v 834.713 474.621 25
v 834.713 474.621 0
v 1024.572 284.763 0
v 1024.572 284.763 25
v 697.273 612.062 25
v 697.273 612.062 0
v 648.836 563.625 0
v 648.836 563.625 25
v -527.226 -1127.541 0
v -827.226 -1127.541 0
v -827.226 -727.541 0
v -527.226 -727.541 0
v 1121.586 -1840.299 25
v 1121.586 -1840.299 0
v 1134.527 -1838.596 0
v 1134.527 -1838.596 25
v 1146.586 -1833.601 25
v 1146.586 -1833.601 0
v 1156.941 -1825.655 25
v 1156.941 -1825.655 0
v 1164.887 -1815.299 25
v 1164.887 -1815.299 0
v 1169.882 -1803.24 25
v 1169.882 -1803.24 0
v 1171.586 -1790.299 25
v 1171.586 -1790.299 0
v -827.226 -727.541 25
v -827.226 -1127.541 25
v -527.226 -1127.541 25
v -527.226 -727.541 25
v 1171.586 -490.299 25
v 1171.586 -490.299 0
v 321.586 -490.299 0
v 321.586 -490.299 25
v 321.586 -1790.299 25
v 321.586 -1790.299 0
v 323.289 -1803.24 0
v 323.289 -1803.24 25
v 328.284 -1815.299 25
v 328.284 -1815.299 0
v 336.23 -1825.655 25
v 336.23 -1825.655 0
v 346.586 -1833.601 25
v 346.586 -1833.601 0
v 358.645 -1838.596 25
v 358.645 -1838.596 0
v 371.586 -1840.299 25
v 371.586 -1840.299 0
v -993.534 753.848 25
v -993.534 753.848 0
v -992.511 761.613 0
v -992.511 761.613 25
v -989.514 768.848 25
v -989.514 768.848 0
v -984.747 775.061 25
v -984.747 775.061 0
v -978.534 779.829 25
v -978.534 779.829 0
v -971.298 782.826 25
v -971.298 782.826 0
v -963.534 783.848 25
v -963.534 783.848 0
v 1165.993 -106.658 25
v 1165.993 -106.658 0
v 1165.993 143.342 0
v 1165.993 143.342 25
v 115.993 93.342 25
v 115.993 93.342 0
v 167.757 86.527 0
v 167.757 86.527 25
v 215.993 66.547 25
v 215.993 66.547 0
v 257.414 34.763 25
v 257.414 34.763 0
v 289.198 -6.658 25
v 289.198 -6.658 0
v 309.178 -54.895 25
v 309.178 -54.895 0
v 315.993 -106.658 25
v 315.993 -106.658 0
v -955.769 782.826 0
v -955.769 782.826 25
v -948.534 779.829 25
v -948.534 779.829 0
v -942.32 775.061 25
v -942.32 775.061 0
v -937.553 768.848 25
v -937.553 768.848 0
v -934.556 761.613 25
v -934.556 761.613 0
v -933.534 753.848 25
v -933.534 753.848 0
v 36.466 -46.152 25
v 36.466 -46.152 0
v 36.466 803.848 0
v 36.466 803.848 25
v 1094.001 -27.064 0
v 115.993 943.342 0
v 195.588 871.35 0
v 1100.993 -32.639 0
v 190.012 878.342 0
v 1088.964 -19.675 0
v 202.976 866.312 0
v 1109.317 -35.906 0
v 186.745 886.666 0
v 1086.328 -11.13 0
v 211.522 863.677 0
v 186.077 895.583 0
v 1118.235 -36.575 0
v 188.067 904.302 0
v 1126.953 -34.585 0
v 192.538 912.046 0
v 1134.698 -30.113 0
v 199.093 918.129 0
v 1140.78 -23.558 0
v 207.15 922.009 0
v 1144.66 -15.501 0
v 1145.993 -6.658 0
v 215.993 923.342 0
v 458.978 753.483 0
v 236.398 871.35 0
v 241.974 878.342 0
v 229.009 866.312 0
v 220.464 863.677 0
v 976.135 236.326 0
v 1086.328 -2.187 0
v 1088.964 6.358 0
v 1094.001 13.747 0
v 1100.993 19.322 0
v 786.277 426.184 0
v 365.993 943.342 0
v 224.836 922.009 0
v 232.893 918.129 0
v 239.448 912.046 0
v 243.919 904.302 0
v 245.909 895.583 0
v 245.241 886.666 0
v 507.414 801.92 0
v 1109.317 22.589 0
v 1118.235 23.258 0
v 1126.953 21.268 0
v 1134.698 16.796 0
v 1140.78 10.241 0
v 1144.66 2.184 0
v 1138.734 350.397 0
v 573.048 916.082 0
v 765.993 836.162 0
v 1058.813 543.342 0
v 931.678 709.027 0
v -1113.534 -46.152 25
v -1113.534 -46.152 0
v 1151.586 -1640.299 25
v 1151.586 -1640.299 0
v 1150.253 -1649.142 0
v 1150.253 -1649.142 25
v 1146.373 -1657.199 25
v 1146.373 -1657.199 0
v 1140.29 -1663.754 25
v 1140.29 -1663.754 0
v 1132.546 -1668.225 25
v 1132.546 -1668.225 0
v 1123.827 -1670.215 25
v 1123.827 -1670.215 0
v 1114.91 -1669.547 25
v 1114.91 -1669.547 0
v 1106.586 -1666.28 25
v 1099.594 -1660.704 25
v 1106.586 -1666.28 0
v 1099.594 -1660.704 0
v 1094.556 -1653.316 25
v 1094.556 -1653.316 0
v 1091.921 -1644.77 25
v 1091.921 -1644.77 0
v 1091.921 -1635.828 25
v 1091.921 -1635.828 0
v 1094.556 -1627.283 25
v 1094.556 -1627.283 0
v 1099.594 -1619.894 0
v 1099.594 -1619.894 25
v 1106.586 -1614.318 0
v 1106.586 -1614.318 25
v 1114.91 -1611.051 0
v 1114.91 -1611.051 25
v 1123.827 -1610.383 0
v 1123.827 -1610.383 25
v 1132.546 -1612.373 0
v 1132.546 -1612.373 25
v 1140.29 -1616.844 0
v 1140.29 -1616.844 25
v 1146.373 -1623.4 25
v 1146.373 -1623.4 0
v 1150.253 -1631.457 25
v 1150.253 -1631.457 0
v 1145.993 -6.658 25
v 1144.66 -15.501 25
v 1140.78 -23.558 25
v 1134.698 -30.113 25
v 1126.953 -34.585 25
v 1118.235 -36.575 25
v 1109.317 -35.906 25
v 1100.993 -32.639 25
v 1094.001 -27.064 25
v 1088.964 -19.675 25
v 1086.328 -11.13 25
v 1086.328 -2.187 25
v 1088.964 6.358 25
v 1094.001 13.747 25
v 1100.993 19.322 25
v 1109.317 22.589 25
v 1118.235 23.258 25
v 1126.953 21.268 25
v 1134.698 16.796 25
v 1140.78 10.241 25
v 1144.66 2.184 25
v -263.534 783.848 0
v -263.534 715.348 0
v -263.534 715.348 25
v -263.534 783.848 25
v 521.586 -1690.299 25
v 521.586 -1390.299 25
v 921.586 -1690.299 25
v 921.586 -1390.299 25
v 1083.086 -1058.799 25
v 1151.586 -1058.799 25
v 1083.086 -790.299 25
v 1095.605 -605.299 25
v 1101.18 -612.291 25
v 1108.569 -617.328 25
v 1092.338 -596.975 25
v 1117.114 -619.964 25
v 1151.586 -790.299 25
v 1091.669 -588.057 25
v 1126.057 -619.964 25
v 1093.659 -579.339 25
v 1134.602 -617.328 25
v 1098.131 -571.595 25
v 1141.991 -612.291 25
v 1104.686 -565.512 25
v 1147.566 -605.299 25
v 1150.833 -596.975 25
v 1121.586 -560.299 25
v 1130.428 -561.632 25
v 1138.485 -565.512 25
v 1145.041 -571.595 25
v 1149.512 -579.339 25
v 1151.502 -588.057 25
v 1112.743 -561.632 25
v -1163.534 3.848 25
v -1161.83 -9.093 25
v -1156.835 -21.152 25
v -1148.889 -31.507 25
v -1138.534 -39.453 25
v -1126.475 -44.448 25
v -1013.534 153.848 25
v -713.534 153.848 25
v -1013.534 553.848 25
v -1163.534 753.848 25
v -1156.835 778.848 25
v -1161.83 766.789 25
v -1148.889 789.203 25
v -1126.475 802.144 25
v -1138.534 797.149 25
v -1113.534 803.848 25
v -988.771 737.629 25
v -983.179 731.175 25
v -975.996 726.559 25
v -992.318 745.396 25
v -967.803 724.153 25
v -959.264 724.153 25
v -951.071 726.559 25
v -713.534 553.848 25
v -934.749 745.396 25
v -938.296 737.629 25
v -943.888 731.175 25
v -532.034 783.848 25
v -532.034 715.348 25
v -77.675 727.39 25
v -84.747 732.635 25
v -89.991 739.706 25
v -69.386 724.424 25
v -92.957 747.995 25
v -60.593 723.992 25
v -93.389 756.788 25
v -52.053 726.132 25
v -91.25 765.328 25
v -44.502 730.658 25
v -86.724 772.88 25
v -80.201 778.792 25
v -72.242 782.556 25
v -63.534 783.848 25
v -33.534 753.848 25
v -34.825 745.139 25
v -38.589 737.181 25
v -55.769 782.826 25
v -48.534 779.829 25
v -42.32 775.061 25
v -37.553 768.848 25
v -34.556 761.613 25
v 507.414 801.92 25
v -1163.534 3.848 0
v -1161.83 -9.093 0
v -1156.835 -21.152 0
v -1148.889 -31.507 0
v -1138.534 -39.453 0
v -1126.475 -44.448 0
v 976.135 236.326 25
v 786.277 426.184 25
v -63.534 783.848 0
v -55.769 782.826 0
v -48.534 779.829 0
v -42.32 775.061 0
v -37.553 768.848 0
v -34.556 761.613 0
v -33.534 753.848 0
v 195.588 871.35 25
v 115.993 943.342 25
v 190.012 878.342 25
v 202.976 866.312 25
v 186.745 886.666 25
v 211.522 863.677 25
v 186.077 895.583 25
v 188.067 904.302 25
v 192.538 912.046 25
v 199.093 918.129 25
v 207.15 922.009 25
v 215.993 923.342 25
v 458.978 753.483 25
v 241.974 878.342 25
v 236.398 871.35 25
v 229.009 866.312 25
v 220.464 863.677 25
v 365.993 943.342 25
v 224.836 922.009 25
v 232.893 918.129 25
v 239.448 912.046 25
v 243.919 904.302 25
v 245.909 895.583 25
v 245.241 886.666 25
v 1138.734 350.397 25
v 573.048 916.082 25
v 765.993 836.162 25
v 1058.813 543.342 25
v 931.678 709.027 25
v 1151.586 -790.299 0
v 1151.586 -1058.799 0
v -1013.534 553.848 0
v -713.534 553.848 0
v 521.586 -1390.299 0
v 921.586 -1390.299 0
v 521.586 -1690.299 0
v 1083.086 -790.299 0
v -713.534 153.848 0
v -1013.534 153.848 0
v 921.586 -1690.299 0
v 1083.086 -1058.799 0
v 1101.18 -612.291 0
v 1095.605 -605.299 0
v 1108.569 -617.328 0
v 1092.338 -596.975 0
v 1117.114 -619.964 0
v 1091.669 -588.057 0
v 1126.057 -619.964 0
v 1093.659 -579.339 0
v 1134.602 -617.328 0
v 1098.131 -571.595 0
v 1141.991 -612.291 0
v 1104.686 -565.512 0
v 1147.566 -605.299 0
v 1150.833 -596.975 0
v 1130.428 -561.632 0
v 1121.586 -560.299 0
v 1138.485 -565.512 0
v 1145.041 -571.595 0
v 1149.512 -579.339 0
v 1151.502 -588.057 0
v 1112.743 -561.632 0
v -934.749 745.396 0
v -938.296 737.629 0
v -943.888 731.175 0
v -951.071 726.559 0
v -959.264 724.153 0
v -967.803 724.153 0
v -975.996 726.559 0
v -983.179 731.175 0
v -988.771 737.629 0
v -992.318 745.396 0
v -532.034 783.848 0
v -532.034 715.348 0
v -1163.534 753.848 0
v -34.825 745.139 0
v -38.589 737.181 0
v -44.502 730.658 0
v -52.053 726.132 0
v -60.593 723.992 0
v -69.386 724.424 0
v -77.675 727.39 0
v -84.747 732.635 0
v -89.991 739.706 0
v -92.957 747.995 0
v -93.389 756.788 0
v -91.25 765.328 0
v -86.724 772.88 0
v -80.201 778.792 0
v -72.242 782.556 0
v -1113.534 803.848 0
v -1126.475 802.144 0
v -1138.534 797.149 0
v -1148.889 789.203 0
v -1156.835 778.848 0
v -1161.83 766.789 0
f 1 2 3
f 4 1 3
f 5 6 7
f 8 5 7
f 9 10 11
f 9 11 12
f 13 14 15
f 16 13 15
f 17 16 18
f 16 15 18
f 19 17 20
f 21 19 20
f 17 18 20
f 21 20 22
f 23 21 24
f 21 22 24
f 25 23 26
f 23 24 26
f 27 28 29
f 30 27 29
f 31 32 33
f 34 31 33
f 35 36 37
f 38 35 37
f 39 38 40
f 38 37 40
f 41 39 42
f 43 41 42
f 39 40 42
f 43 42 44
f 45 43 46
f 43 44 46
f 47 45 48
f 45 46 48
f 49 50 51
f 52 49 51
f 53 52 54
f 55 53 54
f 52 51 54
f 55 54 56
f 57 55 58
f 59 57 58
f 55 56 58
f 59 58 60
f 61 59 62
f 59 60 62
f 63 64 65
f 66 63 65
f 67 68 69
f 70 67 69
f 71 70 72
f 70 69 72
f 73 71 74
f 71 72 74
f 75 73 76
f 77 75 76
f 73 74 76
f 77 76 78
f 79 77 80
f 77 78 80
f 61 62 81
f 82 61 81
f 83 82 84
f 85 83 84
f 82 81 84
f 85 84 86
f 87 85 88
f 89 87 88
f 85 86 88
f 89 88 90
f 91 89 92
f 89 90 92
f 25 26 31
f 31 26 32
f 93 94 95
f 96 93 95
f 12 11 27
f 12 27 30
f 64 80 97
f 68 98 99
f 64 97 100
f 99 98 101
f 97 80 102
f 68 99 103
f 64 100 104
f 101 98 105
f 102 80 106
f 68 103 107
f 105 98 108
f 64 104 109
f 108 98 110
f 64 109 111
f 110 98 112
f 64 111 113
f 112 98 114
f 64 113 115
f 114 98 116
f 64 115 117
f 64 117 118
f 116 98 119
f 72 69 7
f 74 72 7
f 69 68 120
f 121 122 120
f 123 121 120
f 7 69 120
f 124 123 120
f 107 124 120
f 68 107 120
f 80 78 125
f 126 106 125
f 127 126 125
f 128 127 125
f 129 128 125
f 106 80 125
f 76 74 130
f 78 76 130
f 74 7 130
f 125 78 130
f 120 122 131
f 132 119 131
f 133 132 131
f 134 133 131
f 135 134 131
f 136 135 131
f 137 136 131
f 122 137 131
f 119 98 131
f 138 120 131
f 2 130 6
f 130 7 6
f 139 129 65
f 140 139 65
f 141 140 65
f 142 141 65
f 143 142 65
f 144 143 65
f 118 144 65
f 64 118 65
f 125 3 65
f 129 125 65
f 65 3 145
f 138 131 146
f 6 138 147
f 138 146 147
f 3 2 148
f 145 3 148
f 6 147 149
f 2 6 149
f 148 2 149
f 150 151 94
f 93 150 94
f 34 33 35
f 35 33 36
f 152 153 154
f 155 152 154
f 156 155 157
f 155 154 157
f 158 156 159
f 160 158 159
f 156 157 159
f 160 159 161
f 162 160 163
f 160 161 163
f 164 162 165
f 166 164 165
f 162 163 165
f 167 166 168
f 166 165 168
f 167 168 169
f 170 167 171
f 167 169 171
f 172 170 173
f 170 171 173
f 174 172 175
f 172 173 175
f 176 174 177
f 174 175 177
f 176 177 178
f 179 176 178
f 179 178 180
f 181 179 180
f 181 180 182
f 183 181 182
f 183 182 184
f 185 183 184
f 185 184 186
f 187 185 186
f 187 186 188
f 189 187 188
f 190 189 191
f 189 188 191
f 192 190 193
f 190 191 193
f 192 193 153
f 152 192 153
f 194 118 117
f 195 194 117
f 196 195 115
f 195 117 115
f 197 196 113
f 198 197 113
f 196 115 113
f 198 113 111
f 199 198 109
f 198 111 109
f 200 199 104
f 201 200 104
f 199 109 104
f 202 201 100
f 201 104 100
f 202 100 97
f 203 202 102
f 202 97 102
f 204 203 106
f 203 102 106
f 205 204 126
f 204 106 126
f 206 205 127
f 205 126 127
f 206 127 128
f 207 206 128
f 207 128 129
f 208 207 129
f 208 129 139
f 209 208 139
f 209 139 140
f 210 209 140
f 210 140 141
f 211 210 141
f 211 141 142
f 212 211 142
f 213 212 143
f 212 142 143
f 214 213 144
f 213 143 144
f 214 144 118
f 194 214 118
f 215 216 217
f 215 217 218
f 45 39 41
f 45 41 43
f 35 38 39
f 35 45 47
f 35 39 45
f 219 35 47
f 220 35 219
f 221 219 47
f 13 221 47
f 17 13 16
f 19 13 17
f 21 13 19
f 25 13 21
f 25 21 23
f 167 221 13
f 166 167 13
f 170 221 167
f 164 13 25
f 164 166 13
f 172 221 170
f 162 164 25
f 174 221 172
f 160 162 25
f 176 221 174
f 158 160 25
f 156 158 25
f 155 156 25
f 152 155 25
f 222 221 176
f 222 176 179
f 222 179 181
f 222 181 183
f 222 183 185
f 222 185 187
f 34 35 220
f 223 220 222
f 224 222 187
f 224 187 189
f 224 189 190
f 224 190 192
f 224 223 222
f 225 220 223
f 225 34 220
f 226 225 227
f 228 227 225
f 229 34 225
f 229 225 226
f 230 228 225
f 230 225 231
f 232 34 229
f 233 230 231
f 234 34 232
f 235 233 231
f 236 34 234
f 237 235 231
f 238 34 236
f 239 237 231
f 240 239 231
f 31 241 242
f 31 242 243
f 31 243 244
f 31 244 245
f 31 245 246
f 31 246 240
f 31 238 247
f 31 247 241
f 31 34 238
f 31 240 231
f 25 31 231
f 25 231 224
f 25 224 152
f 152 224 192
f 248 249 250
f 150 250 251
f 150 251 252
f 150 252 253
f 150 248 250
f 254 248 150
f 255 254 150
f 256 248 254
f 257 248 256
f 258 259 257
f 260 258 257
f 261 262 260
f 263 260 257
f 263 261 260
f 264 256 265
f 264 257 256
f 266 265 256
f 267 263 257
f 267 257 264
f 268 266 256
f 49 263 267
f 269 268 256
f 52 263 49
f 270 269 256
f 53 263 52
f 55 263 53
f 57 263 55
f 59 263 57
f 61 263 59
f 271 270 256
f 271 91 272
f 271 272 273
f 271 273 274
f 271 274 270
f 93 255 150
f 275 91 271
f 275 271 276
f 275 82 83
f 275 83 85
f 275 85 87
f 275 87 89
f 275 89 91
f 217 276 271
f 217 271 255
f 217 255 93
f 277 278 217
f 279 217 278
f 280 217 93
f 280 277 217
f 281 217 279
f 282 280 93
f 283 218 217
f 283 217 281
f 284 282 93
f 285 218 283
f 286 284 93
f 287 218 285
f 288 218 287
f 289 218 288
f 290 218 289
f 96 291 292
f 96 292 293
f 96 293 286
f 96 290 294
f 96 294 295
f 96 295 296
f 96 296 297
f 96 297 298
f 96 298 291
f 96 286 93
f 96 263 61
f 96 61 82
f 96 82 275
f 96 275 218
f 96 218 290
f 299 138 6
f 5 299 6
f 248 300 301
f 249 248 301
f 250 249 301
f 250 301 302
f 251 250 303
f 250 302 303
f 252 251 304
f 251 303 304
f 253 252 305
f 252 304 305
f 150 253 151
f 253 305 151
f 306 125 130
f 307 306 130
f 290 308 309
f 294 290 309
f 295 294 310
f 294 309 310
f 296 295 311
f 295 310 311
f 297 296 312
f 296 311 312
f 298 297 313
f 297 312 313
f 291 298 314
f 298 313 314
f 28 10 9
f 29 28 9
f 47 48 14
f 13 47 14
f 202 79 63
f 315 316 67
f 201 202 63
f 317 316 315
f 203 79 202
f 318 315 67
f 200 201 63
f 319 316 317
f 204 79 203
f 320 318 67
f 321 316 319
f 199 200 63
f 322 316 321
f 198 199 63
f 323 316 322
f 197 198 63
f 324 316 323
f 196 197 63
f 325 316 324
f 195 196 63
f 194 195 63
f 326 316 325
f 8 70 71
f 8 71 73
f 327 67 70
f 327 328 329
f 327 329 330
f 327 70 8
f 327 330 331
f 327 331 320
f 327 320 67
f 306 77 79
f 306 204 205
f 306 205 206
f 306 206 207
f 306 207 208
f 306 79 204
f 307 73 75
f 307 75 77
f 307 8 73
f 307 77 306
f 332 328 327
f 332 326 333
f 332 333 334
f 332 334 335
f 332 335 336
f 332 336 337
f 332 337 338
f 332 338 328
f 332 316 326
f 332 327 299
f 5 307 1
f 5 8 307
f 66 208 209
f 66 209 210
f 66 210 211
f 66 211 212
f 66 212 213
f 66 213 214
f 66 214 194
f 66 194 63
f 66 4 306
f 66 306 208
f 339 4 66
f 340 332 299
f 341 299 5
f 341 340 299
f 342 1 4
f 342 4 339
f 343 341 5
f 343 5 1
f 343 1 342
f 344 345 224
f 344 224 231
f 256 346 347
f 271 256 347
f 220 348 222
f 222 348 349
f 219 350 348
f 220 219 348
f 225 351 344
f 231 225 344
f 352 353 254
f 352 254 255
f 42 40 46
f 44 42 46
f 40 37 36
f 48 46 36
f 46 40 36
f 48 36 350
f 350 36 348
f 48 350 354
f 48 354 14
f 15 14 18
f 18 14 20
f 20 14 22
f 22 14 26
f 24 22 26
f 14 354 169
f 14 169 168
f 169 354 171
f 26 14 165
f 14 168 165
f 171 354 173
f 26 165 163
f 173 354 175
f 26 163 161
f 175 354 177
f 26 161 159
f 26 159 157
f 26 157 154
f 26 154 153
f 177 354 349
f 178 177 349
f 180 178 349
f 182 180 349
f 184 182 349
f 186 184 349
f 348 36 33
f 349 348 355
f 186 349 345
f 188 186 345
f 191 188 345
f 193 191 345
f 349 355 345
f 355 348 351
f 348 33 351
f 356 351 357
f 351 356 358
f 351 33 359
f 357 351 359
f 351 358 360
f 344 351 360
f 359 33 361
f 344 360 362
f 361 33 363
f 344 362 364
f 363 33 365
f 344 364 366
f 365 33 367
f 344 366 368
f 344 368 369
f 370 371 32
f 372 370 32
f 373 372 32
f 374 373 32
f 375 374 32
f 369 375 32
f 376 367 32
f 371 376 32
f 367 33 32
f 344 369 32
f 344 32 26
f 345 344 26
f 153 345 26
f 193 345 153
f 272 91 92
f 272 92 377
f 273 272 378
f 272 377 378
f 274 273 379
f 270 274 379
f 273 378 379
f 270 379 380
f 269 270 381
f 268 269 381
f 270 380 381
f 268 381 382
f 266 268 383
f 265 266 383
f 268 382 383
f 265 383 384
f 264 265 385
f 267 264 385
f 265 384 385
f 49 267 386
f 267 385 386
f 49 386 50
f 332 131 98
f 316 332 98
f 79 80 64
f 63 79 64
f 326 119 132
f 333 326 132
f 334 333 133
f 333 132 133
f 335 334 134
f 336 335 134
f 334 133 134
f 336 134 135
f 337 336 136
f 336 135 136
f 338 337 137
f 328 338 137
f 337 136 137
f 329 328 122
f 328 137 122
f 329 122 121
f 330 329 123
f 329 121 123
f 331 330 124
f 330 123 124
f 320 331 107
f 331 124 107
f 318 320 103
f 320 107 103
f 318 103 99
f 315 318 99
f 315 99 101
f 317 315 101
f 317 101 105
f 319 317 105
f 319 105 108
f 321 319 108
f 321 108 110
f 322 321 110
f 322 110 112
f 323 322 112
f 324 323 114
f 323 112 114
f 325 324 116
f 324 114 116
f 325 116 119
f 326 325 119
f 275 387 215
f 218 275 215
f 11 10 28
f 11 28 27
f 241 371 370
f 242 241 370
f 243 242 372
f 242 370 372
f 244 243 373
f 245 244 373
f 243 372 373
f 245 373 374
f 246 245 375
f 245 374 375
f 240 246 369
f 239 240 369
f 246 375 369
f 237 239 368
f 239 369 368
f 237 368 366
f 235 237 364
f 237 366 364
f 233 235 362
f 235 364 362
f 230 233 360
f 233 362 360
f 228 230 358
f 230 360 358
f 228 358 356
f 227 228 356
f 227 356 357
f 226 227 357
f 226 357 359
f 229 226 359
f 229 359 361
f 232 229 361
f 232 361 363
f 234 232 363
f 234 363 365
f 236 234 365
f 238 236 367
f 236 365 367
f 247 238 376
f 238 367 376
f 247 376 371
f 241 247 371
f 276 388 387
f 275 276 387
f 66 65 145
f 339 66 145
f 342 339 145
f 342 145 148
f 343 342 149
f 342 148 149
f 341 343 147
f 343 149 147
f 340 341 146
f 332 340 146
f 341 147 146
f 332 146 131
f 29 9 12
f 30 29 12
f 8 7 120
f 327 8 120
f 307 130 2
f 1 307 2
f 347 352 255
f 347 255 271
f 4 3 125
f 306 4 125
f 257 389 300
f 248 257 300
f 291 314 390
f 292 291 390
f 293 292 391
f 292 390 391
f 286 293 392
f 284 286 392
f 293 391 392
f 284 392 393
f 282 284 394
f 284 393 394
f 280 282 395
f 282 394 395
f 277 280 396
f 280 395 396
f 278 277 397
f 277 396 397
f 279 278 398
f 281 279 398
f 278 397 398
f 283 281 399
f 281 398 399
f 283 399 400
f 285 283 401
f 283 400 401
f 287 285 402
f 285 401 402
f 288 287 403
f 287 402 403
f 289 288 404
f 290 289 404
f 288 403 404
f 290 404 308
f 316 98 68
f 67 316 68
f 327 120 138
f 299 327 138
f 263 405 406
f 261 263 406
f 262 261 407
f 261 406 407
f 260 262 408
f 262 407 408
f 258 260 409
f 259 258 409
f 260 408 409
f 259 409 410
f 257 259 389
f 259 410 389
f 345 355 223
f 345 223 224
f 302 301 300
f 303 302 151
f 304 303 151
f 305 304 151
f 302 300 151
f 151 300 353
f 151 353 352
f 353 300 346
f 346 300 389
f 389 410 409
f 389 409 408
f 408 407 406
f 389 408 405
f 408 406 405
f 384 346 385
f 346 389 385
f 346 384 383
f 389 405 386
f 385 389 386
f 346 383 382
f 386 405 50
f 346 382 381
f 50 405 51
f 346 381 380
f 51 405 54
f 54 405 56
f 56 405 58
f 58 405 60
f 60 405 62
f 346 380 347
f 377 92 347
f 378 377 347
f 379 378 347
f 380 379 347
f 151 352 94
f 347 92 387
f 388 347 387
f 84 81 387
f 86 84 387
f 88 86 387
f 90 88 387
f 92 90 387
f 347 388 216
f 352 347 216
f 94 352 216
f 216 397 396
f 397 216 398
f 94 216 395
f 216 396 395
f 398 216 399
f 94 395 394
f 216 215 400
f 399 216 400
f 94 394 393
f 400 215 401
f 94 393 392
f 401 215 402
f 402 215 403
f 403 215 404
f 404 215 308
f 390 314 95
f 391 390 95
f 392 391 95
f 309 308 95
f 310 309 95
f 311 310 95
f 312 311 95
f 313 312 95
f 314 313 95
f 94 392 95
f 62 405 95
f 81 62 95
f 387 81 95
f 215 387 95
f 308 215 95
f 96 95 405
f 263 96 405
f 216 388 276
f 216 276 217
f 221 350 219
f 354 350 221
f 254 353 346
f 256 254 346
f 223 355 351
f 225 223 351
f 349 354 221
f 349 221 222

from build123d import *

# Parameters (mm, degrees)
F0_W     = 268.5
F0_H     = 68.5
F0_W_2   = 300
F0_H_2   = 400
F1_DEPTH = 25
F0_W_3   = 400
F0_H_3   = 300
F0_W_4   = 68.5
F0_H_4   = 268.5


with BuildPart() as f1:
    # F0 (on Top) → F1 (new body)
    with BuildSketch(Plane.XY):
        with BuildLine():
            Line((-1063.5335713625, 803.8479559124), (-1113.5335713625, 803.8479559124))
            ThreePointArc((-1113.5335713625, 803.8479559124), (-1148.8889104218, 789.2032949717), (-1163.5335713625, 753.8479559124))
            Line((-1163.5335713625, 753.8479559124), (-1163.5335713625, 703.8479559124))
            Line((-1163.5335713625, 703.8479559124), (-1063.5335713625, 703.8479559124))
            Line((-1063.5335713625, 703.8479559124), (-1063.5335713625, 753.8479559124))
            Line((-1063.5335713625, 753.8479559124), (-1063.5335713625, 803.8479559124))
        make_face()
        with BuildLine():
            Line((-963.5335713625, 803.8479559124), (-1063.5335713625, 803.8479559124))
            Line((-1063.5335713625, 803.8479559124), (-1063.5335713625, 753.8479559124))
            Line((-1063.5335713625, 753.8479559124), (-993.5335713625, 753.8479559124))
            ThreePointArc((-993.5335713625, 753.8479559124), (-984.7467747981, 775.0611593479), (-963.5335713625, 783.8479559124))
            Line((-963.5335713625, 783.8479559124), (-963.5335713625, 803.8479559124))
        make_face()
        with BuildLine():
            Line((-63.5335713625, 803.8479559124), (-963.5335713625, 803.8479559124))
            Line((-963.5335713625, 803.8479559124), (-963.5335713625, 783.8479559124))
            ThreePointArc((-963.5335713625, 783.8479559124), (-942.3203679269, 775.0611593479), (-933.5335713625, 753.8479559124))
            ThreePointArc((-933.5335713625, 753.8479559124), (-963.5335713625, 723.8479559124), (-993.5335713625, 753.8479559124))
            Line((-993.5335713625, 753.8479559124), (-1063.5335713625, 753.8479559124))
            Line((-1063.5335713625, 753.8479559124), (-1063.5335713625, 703.8479559124))
            Line((-1063.5335713625, 703.8479559124), (36.4664286375, 703.8479559124))
            Line((36.4664286375, 703.8479559124), (36.4664286375, 753.8479559124))
            Line((36.4664286375, 753.8479559124), (-33.5335713625, 753.8479559124))
            ThreePointArc((-33.5335713625, 753.8479559124), (-84.7467747981, 732.6347524768), (-63.5335713625, 783.8479559124))
            Line((-63.5335713625, 783.8479559124), (-63.5335713625, 803.8479559124))
        make_face()
        with Locations((-397.7835713625, 749.5979559124)):
            Rectangle(F0_W, F0_H, mode=Mode.SUBTRACT)
        with BuildLine():
            Line((-1063.5335713625, 703.8479559124), (-1163.5335713625, 703.8479559124))
            Line((-1163.5335713625, 703.8479559124), (-1163.5335713625, 3.8479559124))
            ThreePointArc((-1163.5335713625, 3.8479559124), (-1148.8889104218, -31.507383147), (-1113.5335713625, -46.1520440876))
            Line((-1113.5335713625, -46.1520440876), (36.4664286375, -46.1520440876))
            Line((36.4664286375, -46.1520440876), (36.4664286375, 703.8479559124))
            Line((36.4664286375, 703.8479559124), (-1063.5335713625, 703.8479559124))
        make_face()
        with Locations((-863.5335713625, 353.8479559124)):
            Rectangle(F0_W_2, F0_H_2, mode=Mode.SUBTRACT)
        with BuildLine():
            Line((36.4664286375, 803.8479559124), (-63.5335713625, 803.8479559124))
            Line((-63.5335713625, 803.8479559124), (-63.5335713625, 783.8479559124))
            ThreePointArc((-63.5335713625, 783.8479559124), (-42.3203679269, 775.0611593479), (-33.5335713625, 753.8479559124))
            Line((-33.5335713625, 753.8479559124), (36.4664286375, 753.8479559124))
            Line((36.4664286375, 753.8479559124), (36.4664286375, 803.8479559124))
        make_face()
    extrude(amount=F1_DEPTH)


with BuildPart() as f1b:
    # F0 (on Top) → F1, piece 2 (new body)
    with BuildSketch(Plane.XY):
        with BuildLine():
            Line((215.9929871559, 943.3415107838), (115.9929871559, 943.3415107838))
            Line((115.9929871559, 943.3415107838), (115.9929871559, 893.3415107838))
            Line((115.9929871559, 893.3415107838), (185.9929871559, 893.3415107838))
            ThreePointArc((185.9929871559, 893.3415107838), (194.7797837203, 914.5547142194), (215.9929871559, 923.3415107838))
            Line((215.9929871559, 923.3415107838), (215.9929871559, 943.3415107838))
        make_face()
        with BuildLine():
            Line((365.9929871559, 943.3415107838), (215.9929871559, 943.3415107838))
            Line((215.9929871559, 943.3415107838), (215.9929871559, 923.3415107838))
            ThreePointArc((215.9929871559, 923.3415107838), (237.2061905915, 914.5547142194), (245.9929871559, 893.3415107838))
            ThreePointArc((245.9929871559, 893.3415107838), (215.9929871559, 863.3415107838), (185.9929871559, 893.3415107838))
            Line((185.9929871559, 893.3415107838), (115.9929871559, 893.3415107838))
            Line((115.9929871559, 893.3415107838), (115.9929871559, 843.3415107838))
            Line((115.9929871559, 843.3415107838), (365.9929871559, 843.3415107838))
            Line((365.9929871559, 843.3415107838), (365.9929871559, 943.3415107838))
        make_face()
        with BuildLine():
            Line((474.4453924136, 834.8891055261), (365.9929871559, 943.3415107838))
            Line((365.9929871559, 943.3415107838), (365.9929871559, 843.3415107838))
            ThreePointArc((365.9929871559, 843.3415107838), (420.3836282645, 841.2252103784), (474.4453924136, 834.8891055261))
        make_face()
        with BuildLine():
            ThreePointArc((1165.9929871559, 143.3415107838), (931.6784121052, 709.026935733), (365.9929871559, 943.3415107838))
            Line((365.9929871559, 943.3415107838), (474.4453924136, 834.8891055261))
            ThreePointArc((474.4453924136, 834.8891055261), (860.9677339865, 638.3162576144), (1057.5405818982, 251.7939160415))
            Line((1057.5405818982, 251.7939160415), (1165.9929871559, 143.3415107838))
        make_face()
        with BuildLine():
            Line((365.9929871559, 843.3415107838), (115.9929871559, 843.3415107838))
            Line((115.9929871559, 843.3415107838), (115.9929871559, 93.3415107838))
            ThreePointArc((115.9929871559, 93.3415107838), (257.4143433932, 34.7628670211), (315.9929871559, -106.6584892162))
            Line((315.9929871559, -106.6584892162), (365.8921290354, -106.6584892162))
            Line((365.8921290354, -106.6584892162), (1065.9929871559, -106.6584892162))
            Line((1065.9929871559, -106.6584892162), (1065.9929871559, 143.3415107838))
            ThreePointArc((1065.9929871559, 143.3415107838), (1063.8766867505, 197.7321518924), (1057.5405818982, 251.7939160415))
            Line((1057.5405818982, 251.7939160415), (1024.5716309186, 284.7628670211))
            Line((1024.5716309186, 284.7628670211), (976.1348164073, 236.3260525098))
            Line((976.1348164073, 236.3260525098), (786.2766456587, 426.1842232584))
            Line((786.2766456587, 426.1842232584), (834.71346017, 474.6210377697))
            Line((834.71346017, 474.6210377697), (697.2725141418, 612.0619837979))
            Line((697.2725141418, 612.0619837979), (648.8356996305, 563.6251692866))
            Line((648.8356996305, 563.6251692866), (458.9775288819, 753.4833400352))
            Line((458.9775288819, 753.4833400352), (507.4143433932, 801.9201545465))
            Line((507.4143433932, 801.9201545465), (474.4453924136, 834.8891055261))
            ThreePointArc((474.4453924136, 834.8891055261), (420.3836282645, 841.2252103784), (365.9929871559, 843.3415107838))
        make_face()
        with BuildLine():
            Line((1165.9929871559, -6.6584892162), (1165.9929871559, 143.3415107838))
            Line((1165.9929871559, 143.3415107838), (1065.9929871559, 143.3415107838))
            Line((1065.9929871559, 143.3415107838), (1065.9929871559, -106.6584892162))
            Line((1065.9929871559, -106.6584892162), (1115.9929871559, -106.6584892162))
            Line((1115.9929871559, -106.6584892162), (1115.9929871559, -36.6584892162))
            ThreePointArc((1115.9929871559, -36.6584892162), (1094.7797837203, 14.5547142194), (1145.9929871559, -6.6584892162))
            Line((1145.9929871559, -6.6584892162), (1165.9929871559, -6.6584892162))
        make_face()
        with BuildLine():
            Line((1065.9929871559, 143.3415107838), (1165.9929871559, 143.3415107838))
            Line((1165.9929871559, 143.3415107838), (1057.5405818982, 251.7939160415))
            ThreePointArc((1057.5405818982, 251.7939160415), (1063.8766867505, 197.7321518924), (1065.9929871559, 143.3415107838))
        make_face()
        with BuildLine():
            Line((1165.9929871559, -106.6584892162), (1165.9929871559, -6.6584892162))
            Line((1165.9929871559, -6.6584892162), (1145.9929871559, -6.6584892162))
            ThreePointArc((1145.9929871559, -6.6584892162), (1137.2061905915, -27.8716926518), (1115.9929871559, -36.6584892162))
            Line((1115.9929871559, -36.6584892162), (1115.9929871559, -106.6584892162))
            Line((1115.9929871559, -106.6584892162), (1165.9929871559, -106.6584892162))
        make_face()
        with BuildLine():
            ThreePointArc((1057.5405818982, 251.7939160415), (860.9677339865, 638.3162576144), (474.4453924136, 834.8891055261))
            Line((474.4453924136, 834.8891055261), (507.4143433932, 801.9201545465))
            Line((507.4143433932, 801.9201545465), (697.2725141418, 612.0619837979))
            Line((697.2725141418, 612.0619837979), (834.71346017, 474.6210377697))
            Line((834.71346017, 474.6210377697), (1024.5716309186, 284.7628670211))
            Line((1024.5716309186, 284.7628670211), (1057.5405818982, 251.7939160415))
        make_face()
    extrude(amount=F1_DEPTH)


with BuildPart() as f1c:
    # F0 (on Top) → F1, piece 3 (new body)
    with BuildSketch(Plane.XY):
        with BuildLine():
            Line((1071.585559845, -490.2992320061), (321.585559845, -490.2992320061))
            Line((321.585559845, -490.2992320061), (321.585559845, -1790.2992320061))
            ThreePointArc((321.585559845, -1790.2992320061), (336.2302207856, -1825.6545710654), (371.585559845, -1840.2992320061))
            Line((371.585559845, -1840.2992320061), (1071.585559845, -1840.2992320061))
            Line((1071.585559845, -1840.2992320061), (1071.585559845, -1740.2992320061))
            Line((1071.585559845, -1740.2992320061), (1071.585559845, -490.2992320061))
        make_face()
        with Locations((721.585559845, -1540.2992320061)):
            Rectangle(F0_W_3, F0_H_3, mode=Mode.SUBTRACT)
        with BuildLine():
            Line((1121.585559845, -490.2992320061), (1071.585559845, -490.2992320061))
            Line((1071.585559845, -490.2992320061), (1071.585559845, -1740.2992320061))
            Line((1071.585559845, -1740.2992320061), (1121.585559845, -1740.2992320061))
            Line((1121.585559845, -1740.2992320061), (1121.585559845, -1670.2992320061))
            ThreePointArc((1121.585559845, -1670.2992320061), (1100.3723564094, -1619.0860285705), (1151.585559845, -1640.2992320061))
            Line((1151.585559845, -1640.2992320061), (1171.585559845, -1640.2992320061))
            Line((1171.585559845, -1640.2992320061), (1171.585559845, -590.2992320061))
            Line((1171.585559845, -590.2992320061), (1151.585559845, -590.2992320061))
            ThreePointArc((1151.585559845, -590.2992320061), (1100.3723564094, -611.5124354417), (1121.585559845, -560.2992320061))
            Line((1121.585559845, -560.2992320061), (1121.585559845, -490.2992320061))
        make_face()
        with Locations((1117.335559845, -924.5492320061)):
            Rectangle(F0_W_4, F0_H_4, mode=Mode.SUBTRACT)
        with BuildLine():
            Line((1171.585559845, -490.2992320061), (1121.585559845, -490.2992320061))
            Line((1121.585559845, -490.2992320061), (1121.585559845, -560.2992320061))
            ThreePointArc((1121.585559845, -560.2992320061), (1142.7987632806, -569.0860285705), (1151.585559845, -590.2992320061))
            Line((1151.585559845, -590.2992320061), (1171.585559845, -590.2992320061))
            Line((1171.585559845, -590.2992320061), (1171.585559845, -490.2992320061))
        make_face()
        with BuildLine():
            Line((1121.585559845, -1740.2992320061), (1071.585559845, -1740.2992320061))
            Line((1071.585559845, -1740.2992320061), (1071.585559845, -1840.2992320061))
            Line((1071.585559845, -1840.2992320061), (1121.585559845, -1840.2992320061))
            ThreePointArc((1121.585559845, -1840.2992320061), (1156.9408989043, -1825.6545710654), (1171.585559845, -1790.2992320061))
            Line((1171.585559845, -1790.2992320061), (1171.585559845, -1740.2992320061))
            Line((1171.585559845, -1740.2992320061), (1121.585559845, -1740.2992320061))
        make_face()
        with BuildLine():
            Line((1121.585559845, -1670.2992320061), (1121.585559845, -1740.2992320061))
            Line((1121.585559845, -1740.2992320061), (1171.585559845, -1740.2992320061))
            Line((1171.585559845, -1740.2992320061), (1171.585559845, -1640.2992320061))
            Line((1171.585559845, -1640.2992320061), (1151.585559845, -1640.2992320061))
            ThreePointArc((1151.585559845, -1640.2992320061), (1142.7987632806, -1661.5124354417), (1121.585559845, -1670.2992320061))
        make_face()
    extrude(amount=F1_DEPTH)


with BuildPart() as f1d:
    # F0 (on Top) → F1, piece 4 (new body)
    with BuildSketch(Plane.XY):
        with Locations((-677.2259831429, -927.5414228439)):
            Rectangle(F0_W_2, F0_H_2)
    extrude(amount=F1_DEPTH)


solid = Compound([f1.part, f1b.part, f1c.part, f1d.part])
